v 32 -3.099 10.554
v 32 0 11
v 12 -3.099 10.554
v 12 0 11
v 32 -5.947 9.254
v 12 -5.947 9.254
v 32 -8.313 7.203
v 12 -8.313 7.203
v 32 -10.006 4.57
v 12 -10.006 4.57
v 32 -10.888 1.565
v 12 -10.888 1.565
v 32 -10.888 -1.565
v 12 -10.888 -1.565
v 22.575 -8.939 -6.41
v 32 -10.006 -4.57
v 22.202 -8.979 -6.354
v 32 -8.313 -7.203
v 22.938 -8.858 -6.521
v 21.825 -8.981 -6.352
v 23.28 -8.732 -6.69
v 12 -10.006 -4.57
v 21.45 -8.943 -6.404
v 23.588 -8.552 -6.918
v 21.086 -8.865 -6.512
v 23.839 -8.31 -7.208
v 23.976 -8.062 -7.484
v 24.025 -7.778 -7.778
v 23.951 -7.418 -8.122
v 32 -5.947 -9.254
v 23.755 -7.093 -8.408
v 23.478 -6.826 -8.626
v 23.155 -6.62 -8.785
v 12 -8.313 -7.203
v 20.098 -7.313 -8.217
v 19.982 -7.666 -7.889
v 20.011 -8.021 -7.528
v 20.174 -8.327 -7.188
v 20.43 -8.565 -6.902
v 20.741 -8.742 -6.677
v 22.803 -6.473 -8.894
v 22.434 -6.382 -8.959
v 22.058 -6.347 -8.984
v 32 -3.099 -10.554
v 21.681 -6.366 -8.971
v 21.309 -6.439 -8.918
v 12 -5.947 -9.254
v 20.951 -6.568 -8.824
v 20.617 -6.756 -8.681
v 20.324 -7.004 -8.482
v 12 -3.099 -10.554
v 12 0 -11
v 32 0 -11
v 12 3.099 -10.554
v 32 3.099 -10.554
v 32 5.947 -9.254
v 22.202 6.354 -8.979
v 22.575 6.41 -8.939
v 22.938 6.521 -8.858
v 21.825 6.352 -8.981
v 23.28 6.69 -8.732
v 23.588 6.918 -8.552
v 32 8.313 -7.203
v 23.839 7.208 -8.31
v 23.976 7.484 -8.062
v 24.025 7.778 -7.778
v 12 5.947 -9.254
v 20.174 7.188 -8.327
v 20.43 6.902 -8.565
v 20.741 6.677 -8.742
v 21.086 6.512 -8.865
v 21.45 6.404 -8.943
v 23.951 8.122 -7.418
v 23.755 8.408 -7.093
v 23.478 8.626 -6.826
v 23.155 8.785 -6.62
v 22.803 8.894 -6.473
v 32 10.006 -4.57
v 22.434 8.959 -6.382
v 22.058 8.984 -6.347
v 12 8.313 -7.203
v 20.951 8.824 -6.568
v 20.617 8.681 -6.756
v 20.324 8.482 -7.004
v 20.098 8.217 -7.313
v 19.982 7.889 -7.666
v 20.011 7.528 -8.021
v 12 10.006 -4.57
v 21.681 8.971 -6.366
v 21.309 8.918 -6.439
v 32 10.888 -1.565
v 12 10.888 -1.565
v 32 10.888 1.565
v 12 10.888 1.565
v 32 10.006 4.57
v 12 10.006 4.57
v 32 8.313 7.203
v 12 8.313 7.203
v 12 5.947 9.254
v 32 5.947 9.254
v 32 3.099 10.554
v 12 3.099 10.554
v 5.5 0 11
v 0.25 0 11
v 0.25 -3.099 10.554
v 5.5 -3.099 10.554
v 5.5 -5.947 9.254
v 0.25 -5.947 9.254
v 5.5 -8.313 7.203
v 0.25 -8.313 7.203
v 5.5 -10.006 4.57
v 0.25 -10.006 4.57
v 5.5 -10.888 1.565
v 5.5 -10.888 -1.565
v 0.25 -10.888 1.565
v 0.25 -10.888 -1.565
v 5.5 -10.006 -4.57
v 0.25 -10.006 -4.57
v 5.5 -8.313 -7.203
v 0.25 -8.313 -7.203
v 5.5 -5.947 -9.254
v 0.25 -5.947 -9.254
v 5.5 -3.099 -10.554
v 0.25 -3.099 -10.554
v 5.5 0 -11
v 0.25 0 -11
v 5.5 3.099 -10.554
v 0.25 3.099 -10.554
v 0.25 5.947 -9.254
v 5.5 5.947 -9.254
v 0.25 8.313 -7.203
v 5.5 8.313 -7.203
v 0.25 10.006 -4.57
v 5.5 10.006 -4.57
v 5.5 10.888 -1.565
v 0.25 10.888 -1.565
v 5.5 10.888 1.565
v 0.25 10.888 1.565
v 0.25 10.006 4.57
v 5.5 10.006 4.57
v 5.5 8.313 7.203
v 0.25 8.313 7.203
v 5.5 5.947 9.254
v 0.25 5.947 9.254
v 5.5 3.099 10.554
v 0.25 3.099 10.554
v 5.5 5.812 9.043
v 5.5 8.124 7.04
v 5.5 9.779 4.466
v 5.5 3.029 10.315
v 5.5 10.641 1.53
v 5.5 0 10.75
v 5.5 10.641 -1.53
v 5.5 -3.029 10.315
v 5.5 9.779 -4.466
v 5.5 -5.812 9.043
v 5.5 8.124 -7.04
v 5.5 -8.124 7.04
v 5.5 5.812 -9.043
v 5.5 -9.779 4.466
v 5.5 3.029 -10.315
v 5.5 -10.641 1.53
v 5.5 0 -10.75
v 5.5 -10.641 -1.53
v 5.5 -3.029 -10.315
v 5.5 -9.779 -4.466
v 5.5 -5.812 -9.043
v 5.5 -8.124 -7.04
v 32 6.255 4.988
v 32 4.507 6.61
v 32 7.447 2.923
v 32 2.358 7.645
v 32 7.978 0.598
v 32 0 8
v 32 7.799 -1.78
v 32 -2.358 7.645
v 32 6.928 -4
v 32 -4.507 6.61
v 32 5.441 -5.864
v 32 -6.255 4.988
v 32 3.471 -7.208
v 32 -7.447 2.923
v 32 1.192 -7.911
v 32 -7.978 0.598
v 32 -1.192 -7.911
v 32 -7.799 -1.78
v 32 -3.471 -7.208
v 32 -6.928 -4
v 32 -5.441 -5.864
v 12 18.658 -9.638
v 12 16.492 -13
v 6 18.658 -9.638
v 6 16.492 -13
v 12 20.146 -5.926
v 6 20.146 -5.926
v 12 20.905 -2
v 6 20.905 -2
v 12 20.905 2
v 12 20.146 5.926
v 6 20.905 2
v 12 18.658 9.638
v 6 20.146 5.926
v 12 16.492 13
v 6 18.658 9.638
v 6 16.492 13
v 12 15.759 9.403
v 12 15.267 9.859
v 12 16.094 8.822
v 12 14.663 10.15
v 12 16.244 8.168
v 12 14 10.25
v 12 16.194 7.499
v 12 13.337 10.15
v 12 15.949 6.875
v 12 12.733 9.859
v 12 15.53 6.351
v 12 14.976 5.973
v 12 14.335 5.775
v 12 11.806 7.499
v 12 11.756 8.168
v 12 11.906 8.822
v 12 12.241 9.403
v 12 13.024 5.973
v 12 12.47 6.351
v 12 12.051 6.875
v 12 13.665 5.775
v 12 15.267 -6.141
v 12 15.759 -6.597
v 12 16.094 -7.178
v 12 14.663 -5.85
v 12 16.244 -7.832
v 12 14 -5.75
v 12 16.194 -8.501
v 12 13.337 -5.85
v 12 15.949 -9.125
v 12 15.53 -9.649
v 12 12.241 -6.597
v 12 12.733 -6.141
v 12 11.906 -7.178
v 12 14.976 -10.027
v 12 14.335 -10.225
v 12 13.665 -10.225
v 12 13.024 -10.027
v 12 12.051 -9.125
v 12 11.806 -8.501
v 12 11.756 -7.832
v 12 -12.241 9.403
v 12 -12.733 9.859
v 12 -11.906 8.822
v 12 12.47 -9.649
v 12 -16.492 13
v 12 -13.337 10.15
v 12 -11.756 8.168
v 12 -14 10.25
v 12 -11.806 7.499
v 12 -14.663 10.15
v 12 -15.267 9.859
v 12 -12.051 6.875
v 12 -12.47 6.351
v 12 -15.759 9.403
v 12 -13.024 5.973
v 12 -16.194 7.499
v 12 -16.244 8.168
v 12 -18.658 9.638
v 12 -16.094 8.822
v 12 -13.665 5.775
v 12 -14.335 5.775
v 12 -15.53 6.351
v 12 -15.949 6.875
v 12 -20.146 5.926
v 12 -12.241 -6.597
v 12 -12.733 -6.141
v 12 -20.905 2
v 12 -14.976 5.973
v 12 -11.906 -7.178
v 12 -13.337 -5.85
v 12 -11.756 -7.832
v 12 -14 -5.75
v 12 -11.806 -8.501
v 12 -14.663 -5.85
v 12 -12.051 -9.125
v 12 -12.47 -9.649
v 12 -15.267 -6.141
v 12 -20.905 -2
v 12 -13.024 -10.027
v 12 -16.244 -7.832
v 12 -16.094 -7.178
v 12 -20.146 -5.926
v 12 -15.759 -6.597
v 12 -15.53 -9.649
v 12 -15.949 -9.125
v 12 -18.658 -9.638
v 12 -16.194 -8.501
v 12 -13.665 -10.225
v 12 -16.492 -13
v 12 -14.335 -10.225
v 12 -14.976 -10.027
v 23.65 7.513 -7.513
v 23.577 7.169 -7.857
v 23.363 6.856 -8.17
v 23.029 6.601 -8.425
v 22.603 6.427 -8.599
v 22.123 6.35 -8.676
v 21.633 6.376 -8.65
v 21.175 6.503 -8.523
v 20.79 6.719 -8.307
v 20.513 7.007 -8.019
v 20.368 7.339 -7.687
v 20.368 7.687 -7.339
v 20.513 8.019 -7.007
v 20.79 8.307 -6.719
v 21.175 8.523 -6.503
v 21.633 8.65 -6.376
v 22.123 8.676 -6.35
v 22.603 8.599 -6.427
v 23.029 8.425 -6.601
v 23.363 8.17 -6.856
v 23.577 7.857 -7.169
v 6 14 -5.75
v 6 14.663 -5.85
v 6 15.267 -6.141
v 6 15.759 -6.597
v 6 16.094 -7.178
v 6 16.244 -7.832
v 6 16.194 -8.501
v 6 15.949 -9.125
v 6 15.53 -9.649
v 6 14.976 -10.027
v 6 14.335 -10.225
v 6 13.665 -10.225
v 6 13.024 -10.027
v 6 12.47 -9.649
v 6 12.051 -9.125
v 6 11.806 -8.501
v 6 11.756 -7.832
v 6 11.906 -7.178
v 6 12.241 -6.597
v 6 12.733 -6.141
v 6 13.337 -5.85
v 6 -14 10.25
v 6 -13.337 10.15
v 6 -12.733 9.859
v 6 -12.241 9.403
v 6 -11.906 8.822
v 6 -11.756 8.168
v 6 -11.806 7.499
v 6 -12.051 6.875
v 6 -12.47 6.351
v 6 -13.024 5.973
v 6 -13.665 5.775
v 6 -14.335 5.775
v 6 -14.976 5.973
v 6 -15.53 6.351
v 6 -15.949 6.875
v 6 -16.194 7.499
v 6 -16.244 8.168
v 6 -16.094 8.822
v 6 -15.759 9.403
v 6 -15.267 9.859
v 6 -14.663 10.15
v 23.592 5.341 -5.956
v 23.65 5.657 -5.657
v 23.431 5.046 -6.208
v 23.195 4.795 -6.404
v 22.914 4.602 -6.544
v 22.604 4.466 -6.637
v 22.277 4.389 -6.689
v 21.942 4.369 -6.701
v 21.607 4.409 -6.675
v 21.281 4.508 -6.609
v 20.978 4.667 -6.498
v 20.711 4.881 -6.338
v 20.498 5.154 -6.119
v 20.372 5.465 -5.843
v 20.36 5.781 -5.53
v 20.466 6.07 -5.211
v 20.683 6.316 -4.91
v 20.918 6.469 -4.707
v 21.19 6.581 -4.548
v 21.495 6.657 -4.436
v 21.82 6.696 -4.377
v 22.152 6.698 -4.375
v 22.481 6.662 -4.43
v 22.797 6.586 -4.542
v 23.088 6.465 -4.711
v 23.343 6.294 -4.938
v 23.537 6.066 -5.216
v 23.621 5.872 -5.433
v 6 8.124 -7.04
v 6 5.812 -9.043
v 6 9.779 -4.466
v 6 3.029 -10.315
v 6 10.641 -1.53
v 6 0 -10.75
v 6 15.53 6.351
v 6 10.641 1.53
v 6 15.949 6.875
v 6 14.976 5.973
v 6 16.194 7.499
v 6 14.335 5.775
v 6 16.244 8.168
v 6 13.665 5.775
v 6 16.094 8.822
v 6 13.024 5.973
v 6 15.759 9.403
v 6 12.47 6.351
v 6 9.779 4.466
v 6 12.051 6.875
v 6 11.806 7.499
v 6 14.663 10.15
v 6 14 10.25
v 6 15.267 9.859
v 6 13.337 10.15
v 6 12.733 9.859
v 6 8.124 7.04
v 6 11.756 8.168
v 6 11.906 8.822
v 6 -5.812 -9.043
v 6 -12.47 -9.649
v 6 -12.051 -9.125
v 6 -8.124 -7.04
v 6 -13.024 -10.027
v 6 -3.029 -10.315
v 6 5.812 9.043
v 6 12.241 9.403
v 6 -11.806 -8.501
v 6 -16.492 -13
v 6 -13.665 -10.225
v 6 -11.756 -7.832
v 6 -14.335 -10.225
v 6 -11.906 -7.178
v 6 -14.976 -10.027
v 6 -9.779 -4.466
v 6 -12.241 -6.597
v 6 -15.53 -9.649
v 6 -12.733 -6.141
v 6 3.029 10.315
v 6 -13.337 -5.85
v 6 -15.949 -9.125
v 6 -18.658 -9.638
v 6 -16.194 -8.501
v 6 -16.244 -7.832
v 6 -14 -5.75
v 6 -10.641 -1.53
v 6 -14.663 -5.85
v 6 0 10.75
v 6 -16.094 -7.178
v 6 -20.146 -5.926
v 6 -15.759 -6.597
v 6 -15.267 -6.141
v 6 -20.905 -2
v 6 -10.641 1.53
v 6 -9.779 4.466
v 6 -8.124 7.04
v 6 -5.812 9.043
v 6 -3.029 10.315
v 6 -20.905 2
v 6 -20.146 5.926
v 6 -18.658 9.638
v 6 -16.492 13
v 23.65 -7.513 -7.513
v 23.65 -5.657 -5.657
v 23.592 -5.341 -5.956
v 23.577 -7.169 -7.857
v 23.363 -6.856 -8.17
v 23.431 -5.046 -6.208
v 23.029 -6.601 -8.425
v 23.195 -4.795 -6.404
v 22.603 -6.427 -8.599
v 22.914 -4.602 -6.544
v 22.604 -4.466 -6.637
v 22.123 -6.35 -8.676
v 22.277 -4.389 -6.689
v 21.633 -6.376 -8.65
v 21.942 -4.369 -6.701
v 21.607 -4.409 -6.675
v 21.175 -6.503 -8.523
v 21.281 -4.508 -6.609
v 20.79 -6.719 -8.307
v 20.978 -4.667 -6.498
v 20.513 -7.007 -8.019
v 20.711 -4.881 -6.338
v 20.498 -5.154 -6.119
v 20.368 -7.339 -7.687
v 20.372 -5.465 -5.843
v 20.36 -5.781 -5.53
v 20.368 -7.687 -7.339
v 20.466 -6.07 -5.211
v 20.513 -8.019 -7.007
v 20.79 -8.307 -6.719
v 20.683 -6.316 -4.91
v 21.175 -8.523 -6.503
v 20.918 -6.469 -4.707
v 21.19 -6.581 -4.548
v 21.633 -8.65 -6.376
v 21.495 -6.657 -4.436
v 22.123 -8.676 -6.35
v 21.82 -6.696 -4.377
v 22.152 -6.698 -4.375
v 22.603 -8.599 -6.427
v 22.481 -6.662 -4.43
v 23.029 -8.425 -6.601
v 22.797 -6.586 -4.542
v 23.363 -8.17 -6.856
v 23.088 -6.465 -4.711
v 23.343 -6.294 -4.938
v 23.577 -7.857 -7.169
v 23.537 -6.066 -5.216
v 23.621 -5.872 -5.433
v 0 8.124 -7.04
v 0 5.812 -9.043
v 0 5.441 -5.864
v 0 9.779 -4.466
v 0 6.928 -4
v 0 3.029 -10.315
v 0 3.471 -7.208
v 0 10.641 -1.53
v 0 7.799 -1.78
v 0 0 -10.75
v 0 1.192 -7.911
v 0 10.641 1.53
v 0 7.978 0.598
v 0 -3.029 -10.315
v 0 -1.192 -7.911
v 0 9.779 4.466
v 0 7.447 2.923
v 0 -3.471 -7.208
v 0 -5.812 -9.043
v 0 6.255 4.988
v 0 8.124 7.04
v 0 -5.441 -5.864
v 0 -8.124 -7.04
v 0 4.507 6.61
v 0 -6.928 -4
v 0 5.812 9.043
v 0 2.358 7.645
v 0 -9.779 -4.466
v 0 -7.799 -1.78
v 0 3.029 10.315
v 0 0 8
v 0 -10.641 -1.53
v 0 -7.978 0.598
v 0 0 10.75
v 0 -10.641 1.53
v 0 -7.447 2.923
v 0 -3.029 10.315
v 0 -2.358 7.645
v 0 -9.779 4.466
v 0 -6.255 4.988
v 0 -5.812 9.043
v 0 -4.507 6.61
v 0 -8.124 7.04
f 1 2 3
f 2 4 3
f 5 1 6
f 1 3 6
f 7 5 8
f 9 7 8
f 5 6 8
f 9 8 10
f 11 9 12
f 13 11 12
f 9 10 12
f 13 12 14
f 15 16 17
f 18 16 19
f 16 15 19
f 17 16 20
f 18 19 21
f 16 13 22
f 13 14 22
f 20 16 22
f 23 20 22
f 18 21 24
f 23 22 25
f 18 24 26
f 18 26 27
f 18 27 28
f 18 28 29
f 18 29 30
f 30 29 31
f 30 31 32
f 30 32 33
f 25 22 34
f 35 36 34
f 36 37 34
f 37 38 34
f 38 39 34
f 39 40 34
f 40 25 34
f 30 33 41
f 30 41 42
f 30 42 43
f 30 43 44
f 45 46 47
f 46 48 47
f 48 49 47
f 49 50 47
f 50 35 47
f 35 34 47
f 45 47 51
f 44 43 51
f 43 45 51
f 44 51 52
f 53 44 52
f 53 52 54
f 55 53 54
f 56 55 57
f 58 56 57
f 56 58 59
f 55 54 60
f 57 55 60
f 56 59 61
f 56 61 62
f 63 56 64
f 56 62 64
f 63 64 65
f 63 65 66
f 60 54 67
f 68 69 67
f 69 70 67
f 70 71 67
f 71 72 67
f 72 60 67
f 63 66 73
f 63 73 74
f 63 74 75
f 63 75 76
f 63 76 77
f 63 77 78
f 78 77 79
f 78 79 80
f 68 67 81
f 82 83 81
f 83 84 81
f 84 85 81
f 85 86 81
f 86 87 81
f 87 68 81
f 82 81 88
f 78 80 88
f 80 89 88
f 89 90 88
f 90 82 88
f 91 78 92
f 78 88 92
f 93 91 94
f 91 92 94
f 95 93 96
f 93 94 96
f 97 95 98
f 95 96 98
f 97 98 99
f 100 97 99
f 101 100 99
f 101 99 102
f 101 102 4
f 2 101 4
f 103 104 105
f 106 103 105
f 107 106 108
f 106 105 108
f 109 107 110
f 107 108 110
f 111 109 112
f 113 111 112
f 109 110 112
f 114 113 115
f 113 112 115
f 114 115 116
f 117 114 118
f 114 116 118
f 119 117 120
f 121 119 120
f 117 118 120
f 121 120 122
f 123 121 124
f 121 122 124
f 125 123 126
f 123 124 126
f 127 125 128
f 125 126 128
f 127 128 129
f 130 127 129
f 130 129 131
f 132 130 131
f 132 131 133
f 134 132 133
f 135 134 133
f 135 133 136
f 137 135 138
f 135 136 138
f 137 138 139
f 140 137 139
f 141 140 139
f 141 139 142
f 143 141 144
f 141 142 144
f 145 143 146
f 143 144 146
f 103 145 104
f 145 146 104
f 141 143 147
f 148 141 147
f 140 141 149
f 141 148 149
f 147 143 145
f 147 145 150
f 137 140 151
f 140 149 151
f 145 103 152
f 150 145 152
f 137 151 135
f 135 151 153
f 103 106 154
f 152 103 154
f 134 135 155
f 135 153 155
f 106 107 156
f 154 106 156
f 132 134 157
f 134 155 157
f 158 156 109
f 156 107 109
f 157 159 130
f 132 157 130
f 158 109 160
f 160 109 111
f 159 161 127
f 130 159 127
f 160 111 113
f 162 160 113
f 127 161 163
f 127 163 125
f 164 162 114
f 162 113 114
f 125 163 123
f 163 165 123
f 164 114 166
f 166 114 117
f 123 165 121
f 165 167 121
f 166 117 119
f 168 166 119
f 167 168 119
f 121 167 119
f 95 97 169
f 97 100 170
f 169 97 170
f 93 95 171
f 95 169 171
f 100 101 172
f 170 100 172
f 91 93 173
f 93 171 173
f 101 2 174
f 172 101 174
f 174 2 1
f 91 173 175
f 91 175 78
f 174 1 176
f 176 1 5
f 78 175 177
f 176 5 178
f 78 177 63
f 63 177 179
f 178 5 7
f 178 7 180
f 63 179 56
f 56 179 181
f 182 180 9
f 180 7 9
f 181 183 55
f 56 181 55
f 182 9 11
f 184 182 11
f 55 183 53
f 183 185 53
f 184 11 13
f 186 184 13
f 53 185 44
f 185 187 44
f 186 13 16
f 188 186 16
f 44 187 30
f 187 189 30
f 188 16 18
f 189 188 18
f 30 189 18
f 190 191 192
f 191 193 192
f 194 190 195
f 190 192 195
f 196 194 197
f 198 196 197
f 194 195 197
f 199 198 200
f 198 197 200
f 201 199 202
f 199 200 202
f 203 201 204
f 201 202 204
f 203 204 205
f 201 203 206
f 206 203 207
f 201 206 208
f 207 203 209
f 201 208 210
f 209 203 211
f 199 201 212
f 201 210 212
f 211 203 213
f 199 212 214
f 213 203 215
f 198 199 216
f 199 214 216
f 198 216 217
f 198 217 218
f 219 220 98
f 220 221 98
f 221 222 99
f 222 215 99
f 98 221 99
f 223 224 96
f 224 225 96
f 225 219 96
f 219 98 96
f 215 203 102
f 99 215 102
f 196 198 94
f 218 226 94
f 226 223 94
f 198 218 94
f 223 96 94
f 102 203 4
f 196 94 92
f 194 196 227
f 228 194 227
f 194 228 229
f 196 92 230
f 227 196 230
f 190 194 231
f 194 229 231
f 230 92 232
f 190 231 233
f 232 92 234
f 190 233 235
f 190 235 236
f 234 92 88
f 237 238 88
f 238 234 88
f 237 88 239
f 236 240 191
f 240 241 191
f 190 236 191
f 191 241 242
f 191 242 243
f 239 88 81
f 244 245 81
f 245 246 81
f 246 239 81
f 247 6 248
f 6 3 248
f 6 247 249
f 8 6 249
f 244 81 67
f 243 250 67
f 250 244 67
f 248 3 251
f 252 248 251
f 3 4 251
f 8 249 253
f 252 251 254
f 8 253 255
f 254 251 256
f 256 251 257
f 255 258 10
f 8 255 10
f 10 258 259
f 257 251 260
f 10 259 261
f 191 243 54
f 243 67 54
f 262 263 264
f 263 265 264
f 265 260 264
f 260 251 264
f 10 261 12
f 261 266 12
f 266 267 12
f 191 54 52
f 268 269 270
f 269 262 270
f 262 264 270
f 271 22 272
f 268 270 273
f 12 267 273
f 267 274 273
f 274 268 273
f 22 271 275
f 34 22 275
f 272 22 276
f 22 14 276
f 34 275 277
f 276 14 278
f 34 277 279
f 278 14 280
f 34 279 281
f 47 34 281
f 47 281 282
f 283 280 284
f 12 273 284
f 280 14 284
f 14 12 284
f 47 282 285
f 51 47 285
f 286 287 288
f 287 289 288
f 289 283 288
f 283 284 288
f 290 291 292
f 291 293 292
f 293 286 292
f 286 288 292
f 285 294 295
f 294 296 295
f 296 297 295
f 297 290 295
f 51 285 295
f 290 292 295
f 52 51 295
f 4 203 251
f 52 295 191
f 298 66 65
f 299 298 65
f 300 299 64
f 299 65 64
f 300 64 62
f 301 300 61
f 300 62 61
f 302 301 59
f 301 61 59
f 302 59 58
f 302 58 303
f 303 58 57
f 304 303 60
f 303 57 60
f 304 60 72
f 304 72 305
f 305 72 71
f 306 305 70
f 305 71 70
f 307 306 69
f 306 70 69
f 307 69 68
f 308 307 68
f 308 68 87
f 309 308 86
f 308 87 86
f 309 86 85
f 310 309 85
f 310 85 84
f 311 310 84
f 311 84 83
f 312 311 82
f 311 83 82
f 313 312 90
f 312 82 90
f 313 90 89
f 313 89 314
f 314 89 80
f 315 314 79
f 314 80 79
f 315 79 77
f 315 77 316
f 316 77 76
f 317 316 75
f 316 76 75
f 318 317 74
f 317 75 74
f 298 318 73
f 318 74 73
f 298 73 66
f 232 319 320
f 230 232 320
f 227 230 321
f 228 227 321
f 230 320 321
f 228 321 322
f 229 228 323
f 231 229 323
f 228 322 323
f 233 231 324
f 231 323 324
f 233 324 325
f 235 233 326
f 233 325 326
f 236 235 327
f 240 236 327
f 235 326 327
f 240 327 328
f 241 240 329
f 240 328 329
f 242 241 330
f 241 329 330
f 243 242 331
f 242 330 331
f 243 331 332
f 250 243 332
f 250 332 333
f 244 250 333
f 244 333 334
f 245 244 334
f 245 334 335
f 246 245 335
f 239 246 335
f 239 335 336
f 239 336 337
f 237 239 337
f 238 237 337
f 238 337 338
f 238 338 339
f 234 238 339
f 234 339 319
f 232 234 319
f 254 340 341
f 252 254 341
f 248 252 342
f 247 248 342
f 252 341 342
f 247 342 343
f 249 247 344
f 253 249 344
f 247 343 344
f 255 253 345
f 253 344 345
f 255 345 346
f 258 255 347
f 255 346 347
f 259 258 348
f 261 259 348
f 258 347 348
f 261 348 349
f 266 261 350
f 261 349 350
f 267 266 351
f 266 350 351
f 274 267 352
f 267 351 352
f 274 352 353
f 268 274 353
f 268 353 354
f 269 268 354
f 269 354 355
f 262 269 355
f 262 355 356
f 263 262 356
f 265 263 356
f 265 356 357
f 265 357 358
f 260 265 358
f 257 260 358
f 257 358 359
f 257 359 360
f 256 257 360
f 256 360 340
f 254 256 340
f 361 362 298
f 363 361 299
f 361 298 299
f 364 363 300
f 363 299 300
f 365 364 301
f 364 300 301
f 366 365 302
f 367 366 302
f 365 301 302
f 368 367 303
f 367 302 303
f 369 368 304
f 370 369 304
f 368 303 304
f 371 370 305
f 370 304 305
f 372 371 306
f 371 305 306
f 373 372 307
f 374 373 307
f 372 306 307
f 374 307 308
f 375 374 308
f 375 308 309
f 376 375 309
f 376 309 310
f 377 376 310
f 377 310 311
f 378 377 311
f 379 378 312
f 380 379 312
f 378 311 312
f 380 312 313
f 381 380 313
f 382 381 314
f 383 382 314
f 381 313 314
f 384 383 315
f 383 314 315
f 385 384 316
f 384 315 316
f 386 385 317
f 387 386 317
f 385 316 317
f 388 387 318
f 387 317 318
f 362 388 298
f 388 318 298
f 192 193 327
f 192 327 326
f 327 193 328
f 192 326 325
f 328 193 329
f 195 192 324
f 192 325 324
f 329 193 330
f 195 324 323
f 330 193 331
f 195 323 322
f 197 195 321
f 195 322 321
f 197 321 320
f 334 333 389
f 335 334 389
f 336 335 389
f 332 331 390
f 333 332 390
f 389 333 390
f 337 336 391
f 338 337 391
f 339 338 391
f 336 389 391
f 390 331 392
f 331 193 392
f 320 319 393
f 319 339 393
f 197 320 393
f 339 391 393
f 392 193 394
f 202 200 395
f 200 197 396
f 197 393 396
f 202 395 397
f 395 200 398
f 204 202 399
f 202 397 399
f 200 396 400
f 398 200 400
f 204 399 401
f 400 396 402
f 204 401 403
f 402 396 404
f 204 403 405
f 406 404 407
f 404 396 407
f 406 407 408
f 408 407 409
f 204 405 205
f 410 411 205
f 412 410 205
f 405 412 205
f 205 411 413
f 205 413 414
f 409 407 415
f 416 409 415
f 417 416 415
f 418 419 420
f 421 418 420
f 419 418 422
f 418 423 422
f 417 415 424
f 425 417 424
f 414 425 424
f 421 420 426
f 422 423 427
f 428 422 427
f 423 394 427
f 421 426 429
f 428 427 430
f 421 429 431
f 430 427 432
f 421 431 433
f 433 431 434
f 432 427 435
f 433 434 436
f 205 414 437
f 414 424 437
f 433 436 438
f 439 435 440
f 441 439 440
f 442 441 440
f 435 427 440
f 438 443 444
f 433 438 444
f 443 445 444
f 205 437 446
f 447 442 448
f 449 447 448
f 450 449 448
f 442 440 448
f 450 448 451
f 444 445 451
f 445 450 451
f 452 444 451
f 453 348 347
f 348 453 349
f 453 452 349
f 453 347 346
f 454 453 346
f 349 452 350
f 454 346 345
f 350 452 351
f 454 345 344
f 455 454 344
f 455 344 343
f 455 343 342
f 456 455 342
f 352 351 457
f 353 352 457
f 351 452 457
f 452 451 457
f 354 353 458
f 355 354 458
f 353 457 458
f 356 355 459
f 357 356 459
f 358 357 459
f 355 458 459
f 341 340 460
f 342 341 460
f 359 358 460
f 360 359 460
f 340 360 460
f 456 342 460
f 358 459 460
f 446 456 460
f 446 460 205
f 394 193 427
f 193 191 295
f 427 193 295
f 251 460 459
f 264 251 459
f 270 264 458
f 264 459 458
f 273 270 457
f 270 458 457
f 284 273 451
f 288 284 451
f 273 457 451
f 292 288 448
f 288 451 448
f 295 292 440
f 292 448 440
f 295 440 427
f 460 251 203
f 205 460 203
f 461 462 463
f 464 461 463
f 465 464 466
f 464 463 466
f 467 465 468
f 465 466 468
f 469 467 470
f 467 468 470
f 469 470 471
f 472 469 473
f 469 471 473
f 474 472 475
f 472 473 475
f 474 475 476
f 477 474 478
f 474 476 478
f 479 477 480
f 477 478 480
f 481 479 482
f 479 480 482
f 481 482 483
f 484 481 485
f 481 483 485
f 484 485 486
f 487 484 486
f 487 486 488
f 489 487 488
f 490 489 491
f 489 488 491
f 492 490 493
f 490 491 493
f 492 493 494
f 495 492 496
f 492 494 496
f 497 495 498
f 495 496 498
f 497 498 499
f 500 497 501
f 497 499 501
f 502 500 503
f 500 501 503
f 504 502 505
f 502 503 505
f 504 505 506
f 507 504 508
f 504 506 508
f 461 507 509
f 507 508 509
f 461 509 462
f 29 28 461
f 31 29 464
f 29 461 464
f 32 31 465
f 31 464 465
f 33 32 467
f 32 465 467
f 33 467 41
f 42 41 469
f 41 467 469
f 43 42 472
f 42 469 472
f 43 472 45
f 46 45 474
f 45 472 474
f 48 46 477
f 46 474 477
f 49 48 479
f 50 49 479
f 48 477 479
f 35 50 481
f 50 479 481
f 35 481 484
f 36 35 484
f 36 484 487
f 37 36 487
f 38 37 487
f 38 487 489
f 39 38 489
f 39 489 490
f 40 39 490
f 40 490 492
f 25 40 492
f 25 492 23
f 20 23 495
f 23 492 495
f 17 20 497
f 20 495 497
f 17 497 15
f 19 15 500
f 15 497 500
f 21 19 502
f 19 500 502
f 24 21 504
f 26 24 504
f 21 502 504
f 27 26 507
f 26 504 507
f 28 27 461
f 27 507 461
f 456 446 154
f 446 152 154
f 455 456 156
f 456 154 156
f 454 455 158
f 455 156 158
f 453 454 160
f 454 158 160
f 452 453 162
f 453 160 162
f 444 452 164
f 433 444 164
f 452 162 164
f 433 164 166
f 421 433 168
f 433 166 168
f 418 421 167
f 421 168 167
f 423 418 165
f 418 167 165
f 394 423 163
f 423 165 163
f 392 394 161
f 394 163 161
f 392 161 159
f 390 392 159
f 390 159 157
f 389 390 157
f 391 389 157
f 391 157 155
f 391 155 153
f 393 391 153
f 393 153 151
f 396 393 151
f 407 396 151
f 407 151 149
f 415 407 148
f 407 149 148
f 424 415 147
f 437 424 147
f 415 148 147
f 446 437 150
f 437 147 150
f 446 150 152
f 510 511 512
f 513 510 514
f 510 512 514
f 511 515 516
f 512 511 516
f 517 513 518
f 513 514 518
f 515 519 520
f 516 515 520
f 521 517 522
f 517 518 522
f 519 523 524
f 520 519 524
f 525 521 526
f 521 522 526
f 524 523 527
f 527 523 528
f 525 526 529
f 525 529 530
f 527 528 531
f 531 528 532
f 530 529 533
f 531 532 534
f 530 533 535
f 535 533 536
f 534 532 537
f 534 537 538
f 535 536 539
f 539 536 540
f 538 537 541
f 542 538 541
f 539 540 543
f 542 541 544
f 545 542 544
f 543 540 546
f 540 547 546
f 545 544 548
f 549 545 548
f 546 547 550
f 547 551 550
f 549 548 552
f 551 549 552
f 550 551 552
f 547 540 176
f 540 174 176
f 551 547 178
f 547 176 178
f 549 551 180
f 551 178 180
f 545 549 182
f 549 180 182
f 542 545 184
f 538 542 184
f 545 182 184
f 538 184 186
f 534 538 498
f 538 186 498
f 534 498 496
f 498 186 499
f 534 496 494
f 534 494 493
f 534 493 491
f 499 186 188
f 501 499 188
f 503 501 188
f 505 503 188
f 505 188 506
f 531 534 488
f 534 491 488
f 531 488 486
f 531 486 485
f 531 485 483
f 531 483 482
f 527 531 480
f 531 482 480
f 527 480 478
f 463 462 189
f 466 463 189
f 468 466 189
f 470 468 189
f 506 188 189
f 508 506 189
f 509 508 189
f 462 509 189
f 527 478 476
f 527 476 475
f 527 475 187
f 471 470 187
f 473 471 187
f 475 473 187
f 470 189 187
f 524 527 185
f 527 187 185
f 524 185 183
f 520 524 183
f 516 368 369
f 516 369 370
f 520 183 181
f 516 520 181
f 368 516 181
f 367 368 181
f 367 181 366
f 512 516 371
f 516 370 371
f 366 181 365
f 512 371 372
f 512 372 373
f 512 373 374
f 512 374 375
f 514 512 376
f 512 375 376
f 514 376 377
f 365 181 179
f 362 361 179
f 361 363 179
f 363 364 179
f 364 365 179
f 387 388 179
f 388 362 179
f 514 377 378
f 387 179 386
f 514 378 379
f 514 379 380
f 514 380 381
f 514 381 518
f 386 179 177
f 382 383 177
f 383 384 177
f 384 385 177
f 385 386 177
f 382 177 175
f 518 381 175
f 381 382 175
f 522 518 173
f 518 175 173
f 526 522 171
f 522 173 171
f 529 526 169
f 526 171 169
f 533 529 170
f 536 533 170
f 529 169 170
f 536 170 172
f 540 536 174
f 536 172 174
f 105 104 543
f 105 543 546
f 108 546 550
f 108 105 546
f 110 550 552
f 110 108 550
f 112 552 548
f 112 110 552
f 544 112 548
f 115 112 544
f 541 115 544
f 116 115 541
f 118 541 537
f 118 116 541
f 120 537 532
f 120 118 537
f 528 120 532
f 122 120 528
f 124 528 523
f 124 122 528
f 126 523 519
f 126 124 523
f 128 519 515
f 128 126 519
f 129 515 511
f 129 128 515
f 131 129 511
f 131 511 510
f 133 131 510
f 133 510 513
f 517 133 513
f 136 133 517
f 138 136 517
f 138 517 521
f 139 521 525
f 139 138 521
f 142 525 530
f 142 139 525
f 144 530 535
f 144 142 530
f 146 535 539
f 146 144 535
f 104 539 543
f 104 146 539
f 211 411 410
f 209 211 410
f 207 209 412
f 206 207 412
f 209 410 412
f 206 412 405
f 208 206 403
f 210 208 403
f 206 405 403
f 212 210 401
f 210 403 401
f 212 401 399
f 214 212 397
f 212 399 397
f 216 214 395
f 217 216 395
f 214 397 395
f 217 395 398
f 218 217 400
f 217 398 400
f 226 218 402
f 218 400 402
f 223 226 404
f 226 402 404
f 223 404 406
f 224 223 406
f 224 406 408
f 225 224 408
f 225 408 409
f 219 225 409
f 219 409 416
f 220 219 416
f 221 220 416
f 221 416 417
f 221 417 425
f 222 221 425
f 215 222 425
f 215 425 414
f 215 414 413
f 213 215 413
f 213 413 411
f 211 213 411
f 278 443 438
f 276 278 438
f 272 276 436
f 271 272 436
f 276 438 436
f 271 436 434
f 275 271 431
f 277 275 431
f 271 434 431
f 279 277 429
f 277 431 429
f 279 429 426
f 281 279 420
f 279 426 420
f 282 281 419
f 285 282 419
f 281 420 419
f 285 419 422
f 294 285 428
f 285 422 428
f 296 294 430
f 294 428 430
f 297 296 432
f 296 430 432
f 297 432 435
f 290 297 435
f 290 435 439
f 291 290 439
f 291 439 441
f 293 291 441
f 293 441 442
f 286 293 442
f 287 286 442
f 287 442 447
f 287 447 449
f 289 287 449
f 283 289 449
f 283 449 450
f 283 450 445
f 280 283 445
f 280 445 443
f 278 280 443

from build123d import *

# Parameters (mm, degrees)
CUT_EXTRUDE_1_DEPTH = 36.80502758
CHAMFER_1_SIZE      = 0.25
HOLE_WIZARD_1_D     = 4.5


# Read off the part's stored shape, not the designer's step: M4 螺纹孔1
with BuildPart() as part:
    # 草图2 → 旋转1 (revolve)
    with BuildSketch(Plane.XY, mode=Mode.PRIVATE) as revolve_1_sk:
        Polygon((32, 8), (32, 11), (12, 11), (12, 21), (6, 21), (6, 10.75), (5.5, 10.75), (5.5, 11), (0, 11), (0, 8), align=None)
    revolve(revolve_1_sk.sketch.rotate(Axis((0, 0, 0), (1, 0, 0)), 90), axis=Axis((0, 0, 0), (1, 0, 0)))

    # 草图3 → 切除-拉伸1 (cut, through all)
    with BuildSketch(Plane(origin=(12, 0, 0), x_dir=(0, 0, -1), z_dir=(1, 0, 0))):
        with BuildLine():
            Line((-13, -16.492422502), (-13, 16.492422502))
            ThreePointArc((-13, 16.492422502), (-21, 0), (-13, -16.492422502))
        make_face()
        with BuildLine():
            ThreePointArc((21, 0), (18.894443628, 9.16515139), (13, 16.492422502))
            Line((13, 16.492422502), (13, -16.492422502))
            ThreePointArc((13, -16.492422502), (18.894443628, -9.16515139), (21, 0))
        make_face()
    extrude(amount=-CUT_EXTRUDE_1_DEPTH, mode=Mode.SUBTRACT)

    # 倒角1
    chamfer_1_edges = [part.edges().sort_by_distance(p)[0] for p in [
        (0, 0, -11),
    ]]
    chamfer(chamfer_1_edges, length=CHAMFER_1_SIZE)

    # 孔1 (through all)
    with Locations(Plane(origin=(12, 0, 0), x_dir=(0, 0, -1), z_dir=(1, 0, 0))):
        with Locations((-8, 14), (-8, -14), (8, 14), (8, -14)):
            Hole(HOLE_WIZARD_1_D / 2)

    # M4 螺纹孔1 outline → M4 螺纹孔1 (revolve, cut)
    with BuildSketch(Plane(origin=(22, 0, 0), x_dir=(1, 0, 0), z_dir=(0, 0.707106781186546, 0.707106781186549))):
        Polygon((2.025041593, 11.000041593), (0, 11.000041593), (0, 7.827899387), (1.65, 7.827899387), (1.65, 10.625), align=None)
    revolve(axis=Axis((22, 0, 0), (0, 0.707106781186549, -0.707106781186546)), mode=Mode.SUBTRACT)

    # Hole Wizard M4 _1 2 outline → Hole Wizard M4 _1 2 (revolve, cut)
    with BuildSketch(Plane(origin=(22, 0, 0), x_dir=(1, 0, 0), z_dir=(0, -0.707106781186546, 0.707106781186549))):
        Polygon((0, -11.000091928), (2.025091928, -11.000091928), (1.65, -10.625), (1.65, -7.827899387), (0, -7.827899387), align=None)
    revolve(axis=Axis((22, 0, 0), (0, 0.707106781186549, 0.707106781186546)), mode=Mode.SUBTRACT)


solid = part.part
